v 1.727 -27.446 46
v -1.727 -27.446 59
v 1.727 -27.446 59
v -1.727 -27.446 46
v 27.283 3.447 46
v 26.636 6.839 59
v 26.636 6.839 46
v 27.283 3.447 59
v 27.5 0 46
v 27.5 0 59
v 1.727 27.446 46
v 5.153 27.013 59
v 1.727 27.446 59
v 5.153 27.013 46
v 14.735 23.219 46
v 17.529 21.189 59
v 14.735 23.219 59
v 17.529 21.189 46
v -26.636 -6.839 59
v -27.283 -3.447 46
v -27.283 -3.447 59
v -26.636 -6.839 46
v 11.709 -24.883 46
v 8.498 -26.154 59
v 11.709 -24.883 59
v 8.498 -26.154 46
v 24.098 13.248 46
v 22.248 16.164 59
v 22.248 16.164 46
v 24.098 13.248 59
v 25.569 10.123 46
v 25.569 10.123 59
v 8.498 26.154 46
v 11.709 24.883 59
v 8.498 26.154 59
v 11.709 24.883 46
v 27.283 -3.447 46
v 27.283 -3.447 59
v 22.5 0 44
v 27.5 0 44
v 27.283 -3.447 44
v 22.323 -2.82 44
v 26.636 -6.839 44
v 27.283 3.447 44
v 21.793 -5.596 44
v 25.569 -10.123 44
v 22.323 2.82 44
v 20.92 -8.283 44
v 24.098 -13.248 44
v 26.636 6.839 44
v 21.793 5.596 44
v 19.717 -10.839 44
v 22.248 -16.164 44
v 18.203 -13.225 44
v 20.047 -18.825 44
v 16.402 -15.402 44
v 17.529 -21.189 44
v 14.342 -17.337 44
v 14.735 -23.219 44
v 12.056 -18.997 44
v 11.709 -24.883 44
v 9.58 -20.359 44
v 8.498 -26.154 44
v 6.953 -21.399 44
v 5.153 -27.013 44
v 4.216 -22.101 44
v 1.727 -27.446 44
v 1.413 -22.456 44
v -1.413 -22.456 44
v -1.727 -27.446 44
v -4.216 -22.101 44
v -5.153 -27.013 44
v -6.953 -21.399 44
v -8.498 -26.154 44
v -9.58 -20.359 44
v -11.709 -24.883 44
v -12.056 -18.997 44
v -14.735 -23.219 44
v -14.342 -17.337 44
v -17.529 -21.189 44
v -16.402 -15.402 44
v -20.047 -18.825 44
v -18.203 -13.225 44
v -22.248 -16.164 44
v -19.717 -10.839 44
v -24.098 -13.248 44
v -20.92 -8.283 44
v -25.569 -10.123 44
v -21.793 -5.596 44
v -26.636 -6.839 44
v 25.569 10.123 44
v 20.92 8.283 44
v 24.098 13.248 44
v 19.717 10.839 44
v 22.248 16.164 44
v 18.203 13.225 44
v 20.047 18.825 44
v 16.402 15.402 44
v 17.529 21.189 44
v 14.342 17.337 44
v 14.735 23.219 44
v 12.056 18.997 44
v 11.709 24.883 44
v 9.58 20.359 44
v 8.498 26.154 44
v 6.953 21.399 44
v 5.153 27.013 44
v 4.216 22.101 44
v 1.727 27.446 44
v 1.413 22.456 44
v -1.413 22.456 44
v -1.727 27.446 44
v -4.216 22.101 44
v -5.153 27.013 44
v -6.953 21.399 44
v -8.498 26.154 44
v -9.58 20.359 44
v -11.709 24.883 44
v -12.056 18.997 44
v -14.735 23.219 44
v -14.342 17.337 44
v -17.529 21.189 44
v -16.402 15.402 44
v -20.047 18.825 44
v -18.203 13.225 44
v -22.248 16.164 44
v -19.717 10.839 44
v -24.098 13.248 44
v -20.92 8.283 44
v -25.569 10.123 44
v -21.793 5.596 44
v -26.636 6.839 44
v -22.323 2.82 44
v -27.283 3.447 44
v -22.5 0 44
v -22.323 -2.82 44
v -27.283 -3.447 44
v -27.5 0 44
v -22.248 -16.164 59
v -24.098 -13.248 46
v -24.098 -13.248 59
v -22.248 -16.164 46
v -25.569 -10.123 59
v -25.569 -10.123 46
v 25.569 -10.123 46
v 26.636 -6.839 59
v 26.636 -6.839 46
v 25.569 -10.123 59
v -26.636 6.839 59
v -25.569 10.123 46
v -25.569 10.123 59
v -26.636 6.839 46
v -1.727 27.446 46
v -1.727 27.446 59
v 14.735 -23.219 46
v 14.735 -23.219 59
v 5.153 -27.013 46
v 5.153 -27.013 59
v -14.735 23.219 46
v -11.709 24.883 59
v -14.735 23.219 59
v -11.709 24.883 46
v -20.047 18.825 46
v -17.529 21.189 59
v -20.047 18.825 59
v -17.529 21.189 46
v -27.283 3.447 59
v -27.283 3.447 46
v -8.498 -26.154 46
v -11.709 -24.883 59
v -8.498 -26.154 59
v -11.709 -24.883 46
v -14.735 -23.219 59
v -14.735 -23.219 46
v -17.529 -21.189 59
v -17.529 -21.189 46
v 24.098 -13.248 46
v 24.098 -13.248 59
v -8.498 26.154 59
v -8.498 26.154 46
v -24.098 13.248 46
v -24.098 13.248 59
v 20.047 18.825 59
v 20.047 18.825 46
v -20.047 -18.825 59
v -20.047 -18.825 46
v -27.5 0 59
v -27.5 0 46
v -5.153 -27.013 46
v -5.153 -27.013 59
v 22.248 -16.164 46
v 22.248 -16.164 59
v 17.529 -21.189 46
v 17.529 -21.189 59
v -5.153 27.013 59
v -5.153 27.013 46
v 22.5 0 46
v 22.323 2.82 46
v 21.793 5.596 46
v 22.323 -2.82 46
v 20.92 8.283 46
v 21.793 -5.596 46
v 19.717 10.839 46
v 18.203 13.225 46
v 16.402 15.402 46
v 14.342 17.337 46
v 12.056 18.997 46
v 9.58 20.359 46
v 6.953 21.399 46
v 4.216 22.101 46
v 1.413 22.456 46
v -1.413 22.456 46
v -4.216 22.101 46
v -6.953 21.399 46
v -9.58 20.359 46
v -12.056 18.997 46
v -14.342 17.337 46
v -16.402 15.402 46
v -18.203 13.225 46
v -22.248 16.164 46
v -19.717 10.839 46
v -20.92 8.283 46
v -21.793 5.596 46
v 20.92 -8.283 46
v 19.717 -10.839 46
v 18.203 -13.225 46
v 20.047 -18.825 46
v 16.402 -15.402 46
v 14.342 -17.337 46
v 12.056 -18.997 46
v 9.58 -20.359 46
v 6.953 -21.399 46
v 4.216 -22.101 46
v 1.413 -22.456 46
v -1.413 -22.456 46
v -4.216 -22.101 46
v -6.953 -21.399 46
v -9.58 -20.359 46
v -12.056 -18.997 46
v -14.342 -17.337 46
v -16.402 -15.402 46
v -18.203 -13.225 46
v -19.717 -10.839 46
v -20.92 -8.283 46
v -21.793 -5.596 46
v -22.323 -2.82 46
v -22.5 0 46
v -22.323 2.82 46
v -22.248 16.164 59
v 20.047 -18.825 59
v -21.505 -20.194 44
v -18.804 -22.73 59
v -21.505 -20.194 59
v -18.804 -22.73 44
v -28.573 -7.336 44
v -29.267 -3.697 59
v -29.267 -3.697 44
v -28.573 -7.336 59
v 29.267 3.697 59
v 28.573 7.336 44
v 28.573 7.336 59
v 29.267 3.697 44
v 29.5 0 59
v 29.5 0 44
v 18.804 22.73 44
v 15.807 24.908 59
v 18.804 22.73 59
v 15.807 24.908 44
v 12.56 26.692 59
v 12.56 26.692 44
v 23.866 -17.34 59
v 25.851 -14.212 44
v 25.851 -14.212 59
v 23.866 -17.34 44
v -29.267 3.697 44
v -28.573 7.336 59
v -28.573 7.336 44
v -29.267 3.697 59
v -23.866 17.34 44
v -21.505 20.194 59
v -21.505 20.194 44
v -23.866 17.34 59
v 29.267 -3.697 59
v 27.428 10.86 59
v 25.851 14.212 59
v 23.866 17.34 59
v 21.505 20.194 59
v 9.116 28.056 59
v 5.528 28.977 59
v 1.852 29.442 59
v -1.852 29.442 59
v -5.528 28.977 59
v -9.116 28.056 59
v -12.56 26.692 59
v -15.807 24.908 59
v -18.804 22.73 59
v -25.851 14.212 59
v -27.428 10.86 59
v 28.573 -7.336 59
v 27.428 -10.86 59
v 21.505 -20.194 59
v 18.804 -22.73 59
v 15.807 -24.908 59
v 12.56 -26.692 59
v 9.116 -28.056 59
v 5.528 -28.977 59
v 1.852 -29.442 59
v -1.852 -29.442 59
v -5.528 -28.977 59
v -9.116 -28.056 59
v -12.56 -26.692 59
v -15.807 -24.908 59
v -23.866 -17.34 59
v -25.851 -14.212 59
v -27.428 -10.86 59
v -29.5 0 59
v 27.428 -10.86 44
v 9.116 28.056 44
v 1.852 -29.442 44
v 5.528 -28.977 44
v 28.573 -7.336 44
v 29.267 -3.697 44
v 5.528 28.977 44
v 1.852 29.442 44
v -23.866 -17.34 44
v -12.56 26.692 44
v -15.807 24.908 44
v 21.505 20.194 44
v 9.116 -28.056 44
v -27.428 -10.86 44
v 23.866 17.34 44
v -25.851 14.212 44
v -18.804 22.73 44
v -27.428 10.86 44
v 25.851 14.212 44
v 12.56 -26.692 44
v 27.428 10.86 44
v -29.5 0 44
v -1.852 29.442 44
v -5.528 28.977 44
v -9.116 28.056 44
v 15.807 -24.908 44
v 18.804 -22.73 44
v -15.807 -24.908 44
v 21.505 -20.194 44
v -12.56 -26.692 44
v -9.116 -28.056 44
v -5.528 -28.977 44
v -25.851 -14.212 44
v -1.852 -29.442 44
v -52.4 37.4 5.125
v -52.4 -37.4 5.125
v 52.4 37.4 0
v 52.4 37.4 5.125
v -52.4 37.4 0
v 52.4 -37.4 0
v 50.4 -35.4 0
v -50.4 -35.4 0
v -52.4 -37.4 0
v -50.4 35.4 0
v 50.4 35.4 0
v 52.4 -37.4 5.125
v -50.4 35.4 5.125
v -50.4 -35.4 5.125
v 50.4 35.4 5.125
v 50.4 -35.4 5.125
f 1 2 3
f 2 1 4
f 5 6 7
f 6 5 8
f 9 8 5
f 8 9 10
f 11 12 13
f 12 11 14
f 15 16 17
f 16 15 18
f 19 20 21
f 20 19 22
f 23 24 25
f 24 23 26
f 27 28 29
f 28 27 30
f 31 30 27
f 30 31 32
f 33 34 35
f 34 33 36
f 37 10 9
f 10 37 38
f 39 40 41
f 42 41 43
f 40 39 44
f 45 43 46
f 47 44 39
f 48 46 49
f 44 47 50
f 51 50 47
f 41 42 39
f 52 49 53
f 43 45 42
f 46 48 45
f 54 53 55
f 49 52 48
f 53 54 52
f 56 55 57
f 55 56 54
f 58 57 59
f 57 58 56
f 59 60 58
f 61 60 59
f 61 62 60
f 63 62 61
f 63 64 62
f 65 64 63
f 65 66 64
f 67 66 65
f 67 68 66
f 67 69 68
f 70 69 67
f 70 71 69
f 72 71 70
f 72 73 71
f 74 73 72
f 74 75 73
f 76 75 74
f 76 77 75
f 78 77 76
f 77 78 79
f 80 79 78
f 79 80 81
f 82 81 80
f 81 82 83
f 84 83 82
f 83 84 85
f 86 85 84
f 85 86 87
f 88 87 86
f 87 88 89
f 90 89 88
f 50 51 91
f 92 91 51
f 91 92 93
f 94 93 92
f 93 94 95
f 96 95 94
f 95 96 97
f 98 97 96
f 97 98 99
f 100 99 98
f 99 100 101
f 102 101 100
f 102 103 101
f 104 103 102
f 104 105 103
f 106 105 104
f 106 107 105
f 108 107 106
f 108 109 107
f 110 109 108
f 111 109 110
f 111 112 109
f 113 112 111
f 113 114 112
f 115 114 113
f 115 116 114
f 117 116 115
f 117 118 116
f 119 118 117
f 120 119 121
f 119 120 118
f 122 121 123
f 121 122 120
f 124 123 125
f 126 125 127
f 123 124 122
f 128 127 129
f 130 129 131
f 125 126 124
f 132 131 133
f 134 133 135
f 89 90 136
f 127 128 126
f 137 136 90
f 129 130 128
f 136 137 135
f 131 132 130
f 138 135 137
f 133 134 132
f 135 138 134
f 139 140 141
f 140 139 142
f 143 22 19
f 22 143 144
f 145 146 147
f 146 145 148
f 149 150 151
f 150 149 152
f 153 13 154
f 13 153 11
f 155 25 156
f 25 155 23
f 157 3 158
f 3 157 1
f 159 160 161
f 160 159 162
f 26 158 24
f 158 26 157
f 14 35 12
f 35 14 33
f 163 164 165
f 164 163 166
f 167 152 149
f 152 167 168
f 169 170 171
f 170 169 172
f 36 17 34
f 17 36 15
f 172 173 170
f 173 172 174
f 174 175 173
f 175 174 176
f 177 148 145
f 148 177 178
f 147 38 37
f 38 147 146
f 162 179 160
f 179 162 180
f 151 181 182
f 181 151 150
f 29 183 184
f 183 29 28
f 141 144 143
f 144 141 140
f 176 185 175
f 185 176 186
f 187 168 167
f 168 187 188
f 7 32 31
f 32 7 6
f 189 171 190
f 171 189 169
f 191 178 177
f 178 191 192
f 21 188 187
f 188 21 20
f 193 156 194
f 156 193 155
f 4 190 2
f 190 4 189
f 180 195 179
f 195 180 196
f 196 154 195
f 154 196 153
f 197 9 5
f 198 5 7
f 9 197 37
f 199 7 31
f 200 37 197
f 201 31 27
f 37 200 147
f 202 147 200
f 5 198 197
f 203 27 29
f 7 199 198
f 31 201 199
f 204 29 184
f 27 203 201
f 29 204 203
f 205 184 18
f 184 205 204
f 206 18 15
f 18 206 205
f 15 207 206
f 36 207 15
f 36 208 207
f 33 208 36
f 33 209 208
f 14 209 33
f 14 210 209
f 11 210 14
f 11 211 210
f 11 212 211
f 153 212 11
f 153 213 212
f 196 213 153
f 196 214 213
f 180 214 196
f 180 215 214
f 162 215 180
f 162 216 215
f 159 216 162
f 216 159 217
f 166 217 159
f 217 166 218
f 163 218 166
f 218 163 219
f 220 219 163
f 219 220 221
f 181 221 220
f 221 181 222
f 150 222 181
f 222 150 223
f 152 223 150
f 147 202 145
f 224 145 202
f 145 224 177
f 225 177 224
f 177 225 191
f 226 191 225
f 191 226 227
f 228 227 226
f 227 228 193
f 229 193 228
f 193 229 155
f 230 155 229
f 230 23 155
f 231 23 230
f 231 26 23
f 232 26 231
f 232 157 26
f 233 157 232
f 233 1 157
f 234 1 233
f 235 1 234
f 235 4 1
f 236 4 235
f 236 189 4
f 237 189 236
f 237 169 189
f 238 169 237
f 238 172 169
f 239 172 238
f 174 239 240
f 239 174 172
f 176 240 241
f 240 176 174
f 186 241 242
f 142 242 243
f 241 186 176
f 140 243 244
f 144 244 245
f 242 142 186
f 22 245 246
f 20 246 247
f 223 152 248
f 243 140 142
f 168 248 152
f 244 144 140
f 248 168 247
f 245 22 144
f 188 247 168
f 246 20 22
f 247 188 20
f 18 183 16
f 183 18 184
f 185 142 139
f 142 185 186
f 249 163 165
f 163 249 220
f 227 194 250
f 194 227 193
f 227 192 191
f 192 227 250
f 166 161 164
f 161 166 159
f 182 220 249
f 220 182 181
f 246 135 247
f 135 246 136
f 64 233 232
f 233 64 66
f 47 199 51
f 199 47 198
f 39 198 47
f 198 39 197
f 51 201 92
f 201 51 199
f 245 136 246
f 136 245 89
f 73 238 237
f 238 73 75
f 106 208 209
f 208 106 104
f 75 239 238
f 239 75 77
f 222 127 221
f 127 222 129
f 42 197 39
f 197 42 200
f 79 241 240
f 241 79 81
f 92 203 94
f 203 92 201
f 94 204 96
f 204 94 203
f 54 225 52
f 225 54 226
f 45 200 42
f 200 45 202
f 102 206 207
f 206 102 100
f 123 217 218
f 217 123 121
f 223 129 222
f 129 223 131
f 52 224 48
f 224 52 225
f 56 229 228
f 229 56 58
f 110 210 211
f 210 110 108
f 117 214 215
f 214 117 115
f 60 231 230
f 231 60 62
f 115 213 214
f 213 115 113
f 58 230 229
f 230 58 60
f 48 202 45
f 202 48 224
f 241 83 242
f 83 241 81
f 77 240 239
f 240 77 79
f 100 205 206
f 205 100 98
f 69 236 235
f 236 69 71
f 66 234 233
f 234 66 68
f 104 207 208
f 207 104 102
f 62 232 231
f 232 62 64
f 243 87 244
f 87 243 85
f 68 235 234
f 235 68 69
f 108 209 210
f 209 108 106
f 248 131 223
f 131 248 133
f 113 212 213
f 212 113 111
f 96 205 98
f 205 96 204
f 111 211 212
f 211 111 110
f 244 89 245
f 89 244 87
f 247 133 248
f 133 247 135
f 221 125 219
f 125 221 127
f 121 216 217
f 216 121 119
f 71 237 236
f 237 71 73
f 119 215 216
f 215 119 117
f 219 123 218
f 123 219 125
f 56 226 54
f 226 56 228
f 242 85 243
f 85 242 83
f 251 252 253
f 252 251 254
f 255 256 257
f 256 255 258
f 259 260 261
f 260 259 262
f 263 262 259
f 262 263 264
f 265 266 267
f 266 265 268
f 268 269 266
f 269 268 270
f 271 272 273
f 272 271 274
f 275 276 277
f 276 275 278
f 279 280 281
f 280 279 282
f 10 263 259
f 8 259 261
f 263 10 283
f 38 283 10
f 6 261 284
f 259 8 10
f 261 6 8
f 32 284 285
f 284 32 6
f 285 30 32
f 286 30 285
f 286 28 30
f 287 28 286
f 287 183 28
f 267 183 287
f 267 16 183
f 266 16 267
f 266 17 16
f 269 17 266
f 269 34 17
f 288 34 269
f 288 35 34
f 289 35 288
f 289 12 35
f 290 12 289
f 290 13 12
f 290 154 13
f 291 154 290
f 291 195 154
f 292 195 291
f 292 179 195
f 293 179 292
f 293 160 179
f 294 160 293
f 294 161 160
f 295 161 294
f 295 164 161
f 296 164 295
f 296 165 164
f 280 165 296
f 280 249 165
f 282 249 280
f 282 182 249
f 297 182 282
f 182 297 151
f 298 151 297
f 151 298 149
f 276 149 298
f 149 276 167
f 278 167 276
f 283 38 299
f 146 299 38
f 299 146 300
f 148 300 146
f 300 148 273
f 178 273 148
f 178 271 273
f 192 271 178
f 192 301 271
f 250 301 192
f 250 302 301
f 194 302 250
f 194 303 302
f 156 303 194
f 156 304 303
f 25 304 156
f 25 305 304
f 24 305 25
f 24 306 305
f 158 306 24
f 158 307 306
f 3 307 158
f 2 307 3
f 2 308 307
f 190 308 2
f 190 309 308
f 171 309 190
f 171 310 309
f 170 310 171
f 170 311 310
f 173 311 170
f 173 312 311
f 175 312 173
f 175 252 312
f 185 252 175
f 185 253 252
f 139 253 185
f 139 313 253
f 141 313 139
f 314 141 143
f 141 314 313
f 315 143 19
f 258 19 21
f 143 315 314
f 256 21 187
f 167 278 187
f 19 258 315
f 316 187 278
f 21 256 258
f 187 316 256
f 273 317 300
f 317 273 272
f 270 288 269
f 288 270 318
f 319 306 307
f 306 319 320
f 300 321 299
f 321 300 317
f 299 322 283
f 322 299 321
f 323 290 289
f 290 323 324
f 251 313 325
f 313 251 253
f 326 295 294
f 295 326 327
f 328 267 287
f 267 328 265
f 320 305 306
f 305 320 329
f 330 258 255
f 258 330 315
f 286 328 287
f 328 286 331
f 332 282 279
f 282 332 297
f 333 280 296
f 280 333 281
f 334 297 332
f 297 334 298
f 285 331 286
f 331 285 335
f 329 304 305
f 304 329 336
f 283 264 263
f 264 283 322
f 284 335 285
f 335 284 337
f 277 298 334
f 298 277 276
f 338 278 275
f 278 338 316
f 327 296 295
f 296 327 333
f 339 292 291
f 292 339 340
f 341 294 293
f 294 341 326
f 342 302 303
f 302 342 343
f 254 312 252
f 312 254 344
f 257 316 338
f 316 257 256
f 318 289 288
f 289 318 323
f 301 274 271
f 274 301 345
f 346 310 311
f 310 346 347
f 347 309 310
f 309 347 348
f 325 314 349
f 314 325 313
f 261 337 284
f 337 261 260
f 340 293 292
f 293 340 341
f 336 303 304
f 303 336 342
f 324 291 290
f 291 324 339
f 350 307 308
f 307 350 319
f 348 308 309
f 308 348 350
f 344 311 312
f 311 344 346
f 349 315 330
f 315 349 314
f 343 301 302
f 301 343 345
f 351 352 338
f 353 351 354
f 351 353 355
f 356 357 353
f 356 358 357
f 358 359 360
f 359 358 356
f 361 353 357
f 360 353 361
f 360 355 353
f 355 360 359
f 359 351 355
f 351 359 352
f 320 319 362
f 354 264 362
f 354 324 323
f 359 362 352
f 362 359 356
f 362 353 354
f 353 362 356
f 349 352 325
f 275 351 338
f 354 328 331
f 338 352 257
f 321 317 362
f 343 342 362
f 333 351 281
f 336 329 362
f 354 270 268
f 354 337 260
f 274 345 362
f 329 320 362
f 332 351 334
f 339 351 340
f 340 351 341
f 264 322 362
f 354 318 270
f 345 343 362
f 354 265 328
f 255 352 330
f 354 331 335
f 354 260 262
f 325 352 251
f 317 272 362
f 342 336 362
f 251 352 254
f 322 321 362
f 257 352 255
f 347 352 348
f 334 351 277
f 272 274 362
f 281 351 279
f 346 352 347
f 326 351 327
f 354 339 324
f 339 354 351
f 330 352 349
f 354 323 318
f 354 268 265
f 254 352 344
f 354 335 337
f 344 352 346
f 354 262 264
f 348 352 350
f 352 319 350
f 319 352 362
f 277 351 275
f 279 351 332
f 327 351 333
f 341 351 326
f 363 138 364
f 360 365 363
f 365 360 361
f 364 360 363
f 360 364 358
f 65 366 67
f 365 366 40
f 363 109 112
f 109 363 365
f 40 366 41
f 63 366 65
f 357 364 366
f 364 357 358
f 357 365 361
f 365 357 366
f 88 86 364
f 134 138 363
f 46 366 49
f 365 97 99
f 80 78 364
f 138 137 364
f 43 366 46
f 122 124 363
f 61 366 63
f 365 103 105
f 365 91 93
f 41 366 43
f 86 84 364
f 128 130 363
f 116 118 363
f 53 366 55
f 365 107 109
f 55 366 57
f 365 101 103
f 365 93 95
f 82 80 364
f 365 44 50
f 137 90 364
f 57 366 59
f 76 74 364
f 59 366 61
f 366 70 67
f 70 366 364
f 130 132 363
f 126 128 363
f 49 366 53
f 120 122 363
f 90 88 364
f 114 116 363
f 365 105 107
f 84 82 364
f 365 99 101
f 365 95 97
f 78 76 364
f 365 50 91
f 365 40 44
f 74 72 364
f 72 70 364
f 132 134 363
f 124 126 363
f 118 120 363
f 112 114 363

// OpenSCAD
// Focal Distance is offset by 3mm as that is the thickness of the scanner top plates. You may need to adjust further if your glass sits back a little in the lens.
focalDistance = 50;

// Outer ring height - used to stabilize the camera and block light.
lensRingHeight = 15;

// Probably your true lens diameter.  Size of the opening in the lens hood.
lensInnerDiameter = 45; 

// Outer diameter of your lens, determines the size of the outer ring that surrounds it.
lensOuterDiameter = 55; 

// Determines how think you'd like the walls of the unit to be.
wallThickness = 2; 


translate([0,0,-3]){
    translate([0,0,focalDistance-3]){
        difference(){
            cylinder(h=2,d=lensOuterDiameter,$fn=50);
            translate([0,0,-1]){cylinder(h=5,d=lensInnerDiameter,$fn=50);}
        }
    }

    difference(){
        //outside
        union(){
            translate([0,0,focalDistance-3]){
                cylinder(h=lensRingHeight,d=lensOuterDiameter+wallThickness*2,$fn=50);
            }
            hull(){
                translate([0,0,focalDistance-lensRingHeight-3]){
                    cylinder(h=lensRingHeight,d=lensOuterDiameter+wallThickness*2,$fn=50);
                }
                translate([-100.8/2-wallThickness, -70.8/2-wallThickness,3]){
                    cube([100.8+wallThickness*2, 70.8+wallThickness*2, 5.125]);
                }
            }
        }
        
      //inside  
        union(){
            translate([0,0,focalDistance-2-3]){
                cylinder(h=lensRingHeight+10,d=lensOuterDiameter,$fn=50);
            }

            hull(){
                translate([0,0,focalDistance-lensRingHeight-3]){
                    cylinder(h=lensRingHeight,d=lensOuterDiameter,$fn=50);
                }
                translate([-100.8/2, -70.8/2,1]){
                    cube([100.8, 70.8, 5.125+2]);
                }
            }
        }
    }
}
